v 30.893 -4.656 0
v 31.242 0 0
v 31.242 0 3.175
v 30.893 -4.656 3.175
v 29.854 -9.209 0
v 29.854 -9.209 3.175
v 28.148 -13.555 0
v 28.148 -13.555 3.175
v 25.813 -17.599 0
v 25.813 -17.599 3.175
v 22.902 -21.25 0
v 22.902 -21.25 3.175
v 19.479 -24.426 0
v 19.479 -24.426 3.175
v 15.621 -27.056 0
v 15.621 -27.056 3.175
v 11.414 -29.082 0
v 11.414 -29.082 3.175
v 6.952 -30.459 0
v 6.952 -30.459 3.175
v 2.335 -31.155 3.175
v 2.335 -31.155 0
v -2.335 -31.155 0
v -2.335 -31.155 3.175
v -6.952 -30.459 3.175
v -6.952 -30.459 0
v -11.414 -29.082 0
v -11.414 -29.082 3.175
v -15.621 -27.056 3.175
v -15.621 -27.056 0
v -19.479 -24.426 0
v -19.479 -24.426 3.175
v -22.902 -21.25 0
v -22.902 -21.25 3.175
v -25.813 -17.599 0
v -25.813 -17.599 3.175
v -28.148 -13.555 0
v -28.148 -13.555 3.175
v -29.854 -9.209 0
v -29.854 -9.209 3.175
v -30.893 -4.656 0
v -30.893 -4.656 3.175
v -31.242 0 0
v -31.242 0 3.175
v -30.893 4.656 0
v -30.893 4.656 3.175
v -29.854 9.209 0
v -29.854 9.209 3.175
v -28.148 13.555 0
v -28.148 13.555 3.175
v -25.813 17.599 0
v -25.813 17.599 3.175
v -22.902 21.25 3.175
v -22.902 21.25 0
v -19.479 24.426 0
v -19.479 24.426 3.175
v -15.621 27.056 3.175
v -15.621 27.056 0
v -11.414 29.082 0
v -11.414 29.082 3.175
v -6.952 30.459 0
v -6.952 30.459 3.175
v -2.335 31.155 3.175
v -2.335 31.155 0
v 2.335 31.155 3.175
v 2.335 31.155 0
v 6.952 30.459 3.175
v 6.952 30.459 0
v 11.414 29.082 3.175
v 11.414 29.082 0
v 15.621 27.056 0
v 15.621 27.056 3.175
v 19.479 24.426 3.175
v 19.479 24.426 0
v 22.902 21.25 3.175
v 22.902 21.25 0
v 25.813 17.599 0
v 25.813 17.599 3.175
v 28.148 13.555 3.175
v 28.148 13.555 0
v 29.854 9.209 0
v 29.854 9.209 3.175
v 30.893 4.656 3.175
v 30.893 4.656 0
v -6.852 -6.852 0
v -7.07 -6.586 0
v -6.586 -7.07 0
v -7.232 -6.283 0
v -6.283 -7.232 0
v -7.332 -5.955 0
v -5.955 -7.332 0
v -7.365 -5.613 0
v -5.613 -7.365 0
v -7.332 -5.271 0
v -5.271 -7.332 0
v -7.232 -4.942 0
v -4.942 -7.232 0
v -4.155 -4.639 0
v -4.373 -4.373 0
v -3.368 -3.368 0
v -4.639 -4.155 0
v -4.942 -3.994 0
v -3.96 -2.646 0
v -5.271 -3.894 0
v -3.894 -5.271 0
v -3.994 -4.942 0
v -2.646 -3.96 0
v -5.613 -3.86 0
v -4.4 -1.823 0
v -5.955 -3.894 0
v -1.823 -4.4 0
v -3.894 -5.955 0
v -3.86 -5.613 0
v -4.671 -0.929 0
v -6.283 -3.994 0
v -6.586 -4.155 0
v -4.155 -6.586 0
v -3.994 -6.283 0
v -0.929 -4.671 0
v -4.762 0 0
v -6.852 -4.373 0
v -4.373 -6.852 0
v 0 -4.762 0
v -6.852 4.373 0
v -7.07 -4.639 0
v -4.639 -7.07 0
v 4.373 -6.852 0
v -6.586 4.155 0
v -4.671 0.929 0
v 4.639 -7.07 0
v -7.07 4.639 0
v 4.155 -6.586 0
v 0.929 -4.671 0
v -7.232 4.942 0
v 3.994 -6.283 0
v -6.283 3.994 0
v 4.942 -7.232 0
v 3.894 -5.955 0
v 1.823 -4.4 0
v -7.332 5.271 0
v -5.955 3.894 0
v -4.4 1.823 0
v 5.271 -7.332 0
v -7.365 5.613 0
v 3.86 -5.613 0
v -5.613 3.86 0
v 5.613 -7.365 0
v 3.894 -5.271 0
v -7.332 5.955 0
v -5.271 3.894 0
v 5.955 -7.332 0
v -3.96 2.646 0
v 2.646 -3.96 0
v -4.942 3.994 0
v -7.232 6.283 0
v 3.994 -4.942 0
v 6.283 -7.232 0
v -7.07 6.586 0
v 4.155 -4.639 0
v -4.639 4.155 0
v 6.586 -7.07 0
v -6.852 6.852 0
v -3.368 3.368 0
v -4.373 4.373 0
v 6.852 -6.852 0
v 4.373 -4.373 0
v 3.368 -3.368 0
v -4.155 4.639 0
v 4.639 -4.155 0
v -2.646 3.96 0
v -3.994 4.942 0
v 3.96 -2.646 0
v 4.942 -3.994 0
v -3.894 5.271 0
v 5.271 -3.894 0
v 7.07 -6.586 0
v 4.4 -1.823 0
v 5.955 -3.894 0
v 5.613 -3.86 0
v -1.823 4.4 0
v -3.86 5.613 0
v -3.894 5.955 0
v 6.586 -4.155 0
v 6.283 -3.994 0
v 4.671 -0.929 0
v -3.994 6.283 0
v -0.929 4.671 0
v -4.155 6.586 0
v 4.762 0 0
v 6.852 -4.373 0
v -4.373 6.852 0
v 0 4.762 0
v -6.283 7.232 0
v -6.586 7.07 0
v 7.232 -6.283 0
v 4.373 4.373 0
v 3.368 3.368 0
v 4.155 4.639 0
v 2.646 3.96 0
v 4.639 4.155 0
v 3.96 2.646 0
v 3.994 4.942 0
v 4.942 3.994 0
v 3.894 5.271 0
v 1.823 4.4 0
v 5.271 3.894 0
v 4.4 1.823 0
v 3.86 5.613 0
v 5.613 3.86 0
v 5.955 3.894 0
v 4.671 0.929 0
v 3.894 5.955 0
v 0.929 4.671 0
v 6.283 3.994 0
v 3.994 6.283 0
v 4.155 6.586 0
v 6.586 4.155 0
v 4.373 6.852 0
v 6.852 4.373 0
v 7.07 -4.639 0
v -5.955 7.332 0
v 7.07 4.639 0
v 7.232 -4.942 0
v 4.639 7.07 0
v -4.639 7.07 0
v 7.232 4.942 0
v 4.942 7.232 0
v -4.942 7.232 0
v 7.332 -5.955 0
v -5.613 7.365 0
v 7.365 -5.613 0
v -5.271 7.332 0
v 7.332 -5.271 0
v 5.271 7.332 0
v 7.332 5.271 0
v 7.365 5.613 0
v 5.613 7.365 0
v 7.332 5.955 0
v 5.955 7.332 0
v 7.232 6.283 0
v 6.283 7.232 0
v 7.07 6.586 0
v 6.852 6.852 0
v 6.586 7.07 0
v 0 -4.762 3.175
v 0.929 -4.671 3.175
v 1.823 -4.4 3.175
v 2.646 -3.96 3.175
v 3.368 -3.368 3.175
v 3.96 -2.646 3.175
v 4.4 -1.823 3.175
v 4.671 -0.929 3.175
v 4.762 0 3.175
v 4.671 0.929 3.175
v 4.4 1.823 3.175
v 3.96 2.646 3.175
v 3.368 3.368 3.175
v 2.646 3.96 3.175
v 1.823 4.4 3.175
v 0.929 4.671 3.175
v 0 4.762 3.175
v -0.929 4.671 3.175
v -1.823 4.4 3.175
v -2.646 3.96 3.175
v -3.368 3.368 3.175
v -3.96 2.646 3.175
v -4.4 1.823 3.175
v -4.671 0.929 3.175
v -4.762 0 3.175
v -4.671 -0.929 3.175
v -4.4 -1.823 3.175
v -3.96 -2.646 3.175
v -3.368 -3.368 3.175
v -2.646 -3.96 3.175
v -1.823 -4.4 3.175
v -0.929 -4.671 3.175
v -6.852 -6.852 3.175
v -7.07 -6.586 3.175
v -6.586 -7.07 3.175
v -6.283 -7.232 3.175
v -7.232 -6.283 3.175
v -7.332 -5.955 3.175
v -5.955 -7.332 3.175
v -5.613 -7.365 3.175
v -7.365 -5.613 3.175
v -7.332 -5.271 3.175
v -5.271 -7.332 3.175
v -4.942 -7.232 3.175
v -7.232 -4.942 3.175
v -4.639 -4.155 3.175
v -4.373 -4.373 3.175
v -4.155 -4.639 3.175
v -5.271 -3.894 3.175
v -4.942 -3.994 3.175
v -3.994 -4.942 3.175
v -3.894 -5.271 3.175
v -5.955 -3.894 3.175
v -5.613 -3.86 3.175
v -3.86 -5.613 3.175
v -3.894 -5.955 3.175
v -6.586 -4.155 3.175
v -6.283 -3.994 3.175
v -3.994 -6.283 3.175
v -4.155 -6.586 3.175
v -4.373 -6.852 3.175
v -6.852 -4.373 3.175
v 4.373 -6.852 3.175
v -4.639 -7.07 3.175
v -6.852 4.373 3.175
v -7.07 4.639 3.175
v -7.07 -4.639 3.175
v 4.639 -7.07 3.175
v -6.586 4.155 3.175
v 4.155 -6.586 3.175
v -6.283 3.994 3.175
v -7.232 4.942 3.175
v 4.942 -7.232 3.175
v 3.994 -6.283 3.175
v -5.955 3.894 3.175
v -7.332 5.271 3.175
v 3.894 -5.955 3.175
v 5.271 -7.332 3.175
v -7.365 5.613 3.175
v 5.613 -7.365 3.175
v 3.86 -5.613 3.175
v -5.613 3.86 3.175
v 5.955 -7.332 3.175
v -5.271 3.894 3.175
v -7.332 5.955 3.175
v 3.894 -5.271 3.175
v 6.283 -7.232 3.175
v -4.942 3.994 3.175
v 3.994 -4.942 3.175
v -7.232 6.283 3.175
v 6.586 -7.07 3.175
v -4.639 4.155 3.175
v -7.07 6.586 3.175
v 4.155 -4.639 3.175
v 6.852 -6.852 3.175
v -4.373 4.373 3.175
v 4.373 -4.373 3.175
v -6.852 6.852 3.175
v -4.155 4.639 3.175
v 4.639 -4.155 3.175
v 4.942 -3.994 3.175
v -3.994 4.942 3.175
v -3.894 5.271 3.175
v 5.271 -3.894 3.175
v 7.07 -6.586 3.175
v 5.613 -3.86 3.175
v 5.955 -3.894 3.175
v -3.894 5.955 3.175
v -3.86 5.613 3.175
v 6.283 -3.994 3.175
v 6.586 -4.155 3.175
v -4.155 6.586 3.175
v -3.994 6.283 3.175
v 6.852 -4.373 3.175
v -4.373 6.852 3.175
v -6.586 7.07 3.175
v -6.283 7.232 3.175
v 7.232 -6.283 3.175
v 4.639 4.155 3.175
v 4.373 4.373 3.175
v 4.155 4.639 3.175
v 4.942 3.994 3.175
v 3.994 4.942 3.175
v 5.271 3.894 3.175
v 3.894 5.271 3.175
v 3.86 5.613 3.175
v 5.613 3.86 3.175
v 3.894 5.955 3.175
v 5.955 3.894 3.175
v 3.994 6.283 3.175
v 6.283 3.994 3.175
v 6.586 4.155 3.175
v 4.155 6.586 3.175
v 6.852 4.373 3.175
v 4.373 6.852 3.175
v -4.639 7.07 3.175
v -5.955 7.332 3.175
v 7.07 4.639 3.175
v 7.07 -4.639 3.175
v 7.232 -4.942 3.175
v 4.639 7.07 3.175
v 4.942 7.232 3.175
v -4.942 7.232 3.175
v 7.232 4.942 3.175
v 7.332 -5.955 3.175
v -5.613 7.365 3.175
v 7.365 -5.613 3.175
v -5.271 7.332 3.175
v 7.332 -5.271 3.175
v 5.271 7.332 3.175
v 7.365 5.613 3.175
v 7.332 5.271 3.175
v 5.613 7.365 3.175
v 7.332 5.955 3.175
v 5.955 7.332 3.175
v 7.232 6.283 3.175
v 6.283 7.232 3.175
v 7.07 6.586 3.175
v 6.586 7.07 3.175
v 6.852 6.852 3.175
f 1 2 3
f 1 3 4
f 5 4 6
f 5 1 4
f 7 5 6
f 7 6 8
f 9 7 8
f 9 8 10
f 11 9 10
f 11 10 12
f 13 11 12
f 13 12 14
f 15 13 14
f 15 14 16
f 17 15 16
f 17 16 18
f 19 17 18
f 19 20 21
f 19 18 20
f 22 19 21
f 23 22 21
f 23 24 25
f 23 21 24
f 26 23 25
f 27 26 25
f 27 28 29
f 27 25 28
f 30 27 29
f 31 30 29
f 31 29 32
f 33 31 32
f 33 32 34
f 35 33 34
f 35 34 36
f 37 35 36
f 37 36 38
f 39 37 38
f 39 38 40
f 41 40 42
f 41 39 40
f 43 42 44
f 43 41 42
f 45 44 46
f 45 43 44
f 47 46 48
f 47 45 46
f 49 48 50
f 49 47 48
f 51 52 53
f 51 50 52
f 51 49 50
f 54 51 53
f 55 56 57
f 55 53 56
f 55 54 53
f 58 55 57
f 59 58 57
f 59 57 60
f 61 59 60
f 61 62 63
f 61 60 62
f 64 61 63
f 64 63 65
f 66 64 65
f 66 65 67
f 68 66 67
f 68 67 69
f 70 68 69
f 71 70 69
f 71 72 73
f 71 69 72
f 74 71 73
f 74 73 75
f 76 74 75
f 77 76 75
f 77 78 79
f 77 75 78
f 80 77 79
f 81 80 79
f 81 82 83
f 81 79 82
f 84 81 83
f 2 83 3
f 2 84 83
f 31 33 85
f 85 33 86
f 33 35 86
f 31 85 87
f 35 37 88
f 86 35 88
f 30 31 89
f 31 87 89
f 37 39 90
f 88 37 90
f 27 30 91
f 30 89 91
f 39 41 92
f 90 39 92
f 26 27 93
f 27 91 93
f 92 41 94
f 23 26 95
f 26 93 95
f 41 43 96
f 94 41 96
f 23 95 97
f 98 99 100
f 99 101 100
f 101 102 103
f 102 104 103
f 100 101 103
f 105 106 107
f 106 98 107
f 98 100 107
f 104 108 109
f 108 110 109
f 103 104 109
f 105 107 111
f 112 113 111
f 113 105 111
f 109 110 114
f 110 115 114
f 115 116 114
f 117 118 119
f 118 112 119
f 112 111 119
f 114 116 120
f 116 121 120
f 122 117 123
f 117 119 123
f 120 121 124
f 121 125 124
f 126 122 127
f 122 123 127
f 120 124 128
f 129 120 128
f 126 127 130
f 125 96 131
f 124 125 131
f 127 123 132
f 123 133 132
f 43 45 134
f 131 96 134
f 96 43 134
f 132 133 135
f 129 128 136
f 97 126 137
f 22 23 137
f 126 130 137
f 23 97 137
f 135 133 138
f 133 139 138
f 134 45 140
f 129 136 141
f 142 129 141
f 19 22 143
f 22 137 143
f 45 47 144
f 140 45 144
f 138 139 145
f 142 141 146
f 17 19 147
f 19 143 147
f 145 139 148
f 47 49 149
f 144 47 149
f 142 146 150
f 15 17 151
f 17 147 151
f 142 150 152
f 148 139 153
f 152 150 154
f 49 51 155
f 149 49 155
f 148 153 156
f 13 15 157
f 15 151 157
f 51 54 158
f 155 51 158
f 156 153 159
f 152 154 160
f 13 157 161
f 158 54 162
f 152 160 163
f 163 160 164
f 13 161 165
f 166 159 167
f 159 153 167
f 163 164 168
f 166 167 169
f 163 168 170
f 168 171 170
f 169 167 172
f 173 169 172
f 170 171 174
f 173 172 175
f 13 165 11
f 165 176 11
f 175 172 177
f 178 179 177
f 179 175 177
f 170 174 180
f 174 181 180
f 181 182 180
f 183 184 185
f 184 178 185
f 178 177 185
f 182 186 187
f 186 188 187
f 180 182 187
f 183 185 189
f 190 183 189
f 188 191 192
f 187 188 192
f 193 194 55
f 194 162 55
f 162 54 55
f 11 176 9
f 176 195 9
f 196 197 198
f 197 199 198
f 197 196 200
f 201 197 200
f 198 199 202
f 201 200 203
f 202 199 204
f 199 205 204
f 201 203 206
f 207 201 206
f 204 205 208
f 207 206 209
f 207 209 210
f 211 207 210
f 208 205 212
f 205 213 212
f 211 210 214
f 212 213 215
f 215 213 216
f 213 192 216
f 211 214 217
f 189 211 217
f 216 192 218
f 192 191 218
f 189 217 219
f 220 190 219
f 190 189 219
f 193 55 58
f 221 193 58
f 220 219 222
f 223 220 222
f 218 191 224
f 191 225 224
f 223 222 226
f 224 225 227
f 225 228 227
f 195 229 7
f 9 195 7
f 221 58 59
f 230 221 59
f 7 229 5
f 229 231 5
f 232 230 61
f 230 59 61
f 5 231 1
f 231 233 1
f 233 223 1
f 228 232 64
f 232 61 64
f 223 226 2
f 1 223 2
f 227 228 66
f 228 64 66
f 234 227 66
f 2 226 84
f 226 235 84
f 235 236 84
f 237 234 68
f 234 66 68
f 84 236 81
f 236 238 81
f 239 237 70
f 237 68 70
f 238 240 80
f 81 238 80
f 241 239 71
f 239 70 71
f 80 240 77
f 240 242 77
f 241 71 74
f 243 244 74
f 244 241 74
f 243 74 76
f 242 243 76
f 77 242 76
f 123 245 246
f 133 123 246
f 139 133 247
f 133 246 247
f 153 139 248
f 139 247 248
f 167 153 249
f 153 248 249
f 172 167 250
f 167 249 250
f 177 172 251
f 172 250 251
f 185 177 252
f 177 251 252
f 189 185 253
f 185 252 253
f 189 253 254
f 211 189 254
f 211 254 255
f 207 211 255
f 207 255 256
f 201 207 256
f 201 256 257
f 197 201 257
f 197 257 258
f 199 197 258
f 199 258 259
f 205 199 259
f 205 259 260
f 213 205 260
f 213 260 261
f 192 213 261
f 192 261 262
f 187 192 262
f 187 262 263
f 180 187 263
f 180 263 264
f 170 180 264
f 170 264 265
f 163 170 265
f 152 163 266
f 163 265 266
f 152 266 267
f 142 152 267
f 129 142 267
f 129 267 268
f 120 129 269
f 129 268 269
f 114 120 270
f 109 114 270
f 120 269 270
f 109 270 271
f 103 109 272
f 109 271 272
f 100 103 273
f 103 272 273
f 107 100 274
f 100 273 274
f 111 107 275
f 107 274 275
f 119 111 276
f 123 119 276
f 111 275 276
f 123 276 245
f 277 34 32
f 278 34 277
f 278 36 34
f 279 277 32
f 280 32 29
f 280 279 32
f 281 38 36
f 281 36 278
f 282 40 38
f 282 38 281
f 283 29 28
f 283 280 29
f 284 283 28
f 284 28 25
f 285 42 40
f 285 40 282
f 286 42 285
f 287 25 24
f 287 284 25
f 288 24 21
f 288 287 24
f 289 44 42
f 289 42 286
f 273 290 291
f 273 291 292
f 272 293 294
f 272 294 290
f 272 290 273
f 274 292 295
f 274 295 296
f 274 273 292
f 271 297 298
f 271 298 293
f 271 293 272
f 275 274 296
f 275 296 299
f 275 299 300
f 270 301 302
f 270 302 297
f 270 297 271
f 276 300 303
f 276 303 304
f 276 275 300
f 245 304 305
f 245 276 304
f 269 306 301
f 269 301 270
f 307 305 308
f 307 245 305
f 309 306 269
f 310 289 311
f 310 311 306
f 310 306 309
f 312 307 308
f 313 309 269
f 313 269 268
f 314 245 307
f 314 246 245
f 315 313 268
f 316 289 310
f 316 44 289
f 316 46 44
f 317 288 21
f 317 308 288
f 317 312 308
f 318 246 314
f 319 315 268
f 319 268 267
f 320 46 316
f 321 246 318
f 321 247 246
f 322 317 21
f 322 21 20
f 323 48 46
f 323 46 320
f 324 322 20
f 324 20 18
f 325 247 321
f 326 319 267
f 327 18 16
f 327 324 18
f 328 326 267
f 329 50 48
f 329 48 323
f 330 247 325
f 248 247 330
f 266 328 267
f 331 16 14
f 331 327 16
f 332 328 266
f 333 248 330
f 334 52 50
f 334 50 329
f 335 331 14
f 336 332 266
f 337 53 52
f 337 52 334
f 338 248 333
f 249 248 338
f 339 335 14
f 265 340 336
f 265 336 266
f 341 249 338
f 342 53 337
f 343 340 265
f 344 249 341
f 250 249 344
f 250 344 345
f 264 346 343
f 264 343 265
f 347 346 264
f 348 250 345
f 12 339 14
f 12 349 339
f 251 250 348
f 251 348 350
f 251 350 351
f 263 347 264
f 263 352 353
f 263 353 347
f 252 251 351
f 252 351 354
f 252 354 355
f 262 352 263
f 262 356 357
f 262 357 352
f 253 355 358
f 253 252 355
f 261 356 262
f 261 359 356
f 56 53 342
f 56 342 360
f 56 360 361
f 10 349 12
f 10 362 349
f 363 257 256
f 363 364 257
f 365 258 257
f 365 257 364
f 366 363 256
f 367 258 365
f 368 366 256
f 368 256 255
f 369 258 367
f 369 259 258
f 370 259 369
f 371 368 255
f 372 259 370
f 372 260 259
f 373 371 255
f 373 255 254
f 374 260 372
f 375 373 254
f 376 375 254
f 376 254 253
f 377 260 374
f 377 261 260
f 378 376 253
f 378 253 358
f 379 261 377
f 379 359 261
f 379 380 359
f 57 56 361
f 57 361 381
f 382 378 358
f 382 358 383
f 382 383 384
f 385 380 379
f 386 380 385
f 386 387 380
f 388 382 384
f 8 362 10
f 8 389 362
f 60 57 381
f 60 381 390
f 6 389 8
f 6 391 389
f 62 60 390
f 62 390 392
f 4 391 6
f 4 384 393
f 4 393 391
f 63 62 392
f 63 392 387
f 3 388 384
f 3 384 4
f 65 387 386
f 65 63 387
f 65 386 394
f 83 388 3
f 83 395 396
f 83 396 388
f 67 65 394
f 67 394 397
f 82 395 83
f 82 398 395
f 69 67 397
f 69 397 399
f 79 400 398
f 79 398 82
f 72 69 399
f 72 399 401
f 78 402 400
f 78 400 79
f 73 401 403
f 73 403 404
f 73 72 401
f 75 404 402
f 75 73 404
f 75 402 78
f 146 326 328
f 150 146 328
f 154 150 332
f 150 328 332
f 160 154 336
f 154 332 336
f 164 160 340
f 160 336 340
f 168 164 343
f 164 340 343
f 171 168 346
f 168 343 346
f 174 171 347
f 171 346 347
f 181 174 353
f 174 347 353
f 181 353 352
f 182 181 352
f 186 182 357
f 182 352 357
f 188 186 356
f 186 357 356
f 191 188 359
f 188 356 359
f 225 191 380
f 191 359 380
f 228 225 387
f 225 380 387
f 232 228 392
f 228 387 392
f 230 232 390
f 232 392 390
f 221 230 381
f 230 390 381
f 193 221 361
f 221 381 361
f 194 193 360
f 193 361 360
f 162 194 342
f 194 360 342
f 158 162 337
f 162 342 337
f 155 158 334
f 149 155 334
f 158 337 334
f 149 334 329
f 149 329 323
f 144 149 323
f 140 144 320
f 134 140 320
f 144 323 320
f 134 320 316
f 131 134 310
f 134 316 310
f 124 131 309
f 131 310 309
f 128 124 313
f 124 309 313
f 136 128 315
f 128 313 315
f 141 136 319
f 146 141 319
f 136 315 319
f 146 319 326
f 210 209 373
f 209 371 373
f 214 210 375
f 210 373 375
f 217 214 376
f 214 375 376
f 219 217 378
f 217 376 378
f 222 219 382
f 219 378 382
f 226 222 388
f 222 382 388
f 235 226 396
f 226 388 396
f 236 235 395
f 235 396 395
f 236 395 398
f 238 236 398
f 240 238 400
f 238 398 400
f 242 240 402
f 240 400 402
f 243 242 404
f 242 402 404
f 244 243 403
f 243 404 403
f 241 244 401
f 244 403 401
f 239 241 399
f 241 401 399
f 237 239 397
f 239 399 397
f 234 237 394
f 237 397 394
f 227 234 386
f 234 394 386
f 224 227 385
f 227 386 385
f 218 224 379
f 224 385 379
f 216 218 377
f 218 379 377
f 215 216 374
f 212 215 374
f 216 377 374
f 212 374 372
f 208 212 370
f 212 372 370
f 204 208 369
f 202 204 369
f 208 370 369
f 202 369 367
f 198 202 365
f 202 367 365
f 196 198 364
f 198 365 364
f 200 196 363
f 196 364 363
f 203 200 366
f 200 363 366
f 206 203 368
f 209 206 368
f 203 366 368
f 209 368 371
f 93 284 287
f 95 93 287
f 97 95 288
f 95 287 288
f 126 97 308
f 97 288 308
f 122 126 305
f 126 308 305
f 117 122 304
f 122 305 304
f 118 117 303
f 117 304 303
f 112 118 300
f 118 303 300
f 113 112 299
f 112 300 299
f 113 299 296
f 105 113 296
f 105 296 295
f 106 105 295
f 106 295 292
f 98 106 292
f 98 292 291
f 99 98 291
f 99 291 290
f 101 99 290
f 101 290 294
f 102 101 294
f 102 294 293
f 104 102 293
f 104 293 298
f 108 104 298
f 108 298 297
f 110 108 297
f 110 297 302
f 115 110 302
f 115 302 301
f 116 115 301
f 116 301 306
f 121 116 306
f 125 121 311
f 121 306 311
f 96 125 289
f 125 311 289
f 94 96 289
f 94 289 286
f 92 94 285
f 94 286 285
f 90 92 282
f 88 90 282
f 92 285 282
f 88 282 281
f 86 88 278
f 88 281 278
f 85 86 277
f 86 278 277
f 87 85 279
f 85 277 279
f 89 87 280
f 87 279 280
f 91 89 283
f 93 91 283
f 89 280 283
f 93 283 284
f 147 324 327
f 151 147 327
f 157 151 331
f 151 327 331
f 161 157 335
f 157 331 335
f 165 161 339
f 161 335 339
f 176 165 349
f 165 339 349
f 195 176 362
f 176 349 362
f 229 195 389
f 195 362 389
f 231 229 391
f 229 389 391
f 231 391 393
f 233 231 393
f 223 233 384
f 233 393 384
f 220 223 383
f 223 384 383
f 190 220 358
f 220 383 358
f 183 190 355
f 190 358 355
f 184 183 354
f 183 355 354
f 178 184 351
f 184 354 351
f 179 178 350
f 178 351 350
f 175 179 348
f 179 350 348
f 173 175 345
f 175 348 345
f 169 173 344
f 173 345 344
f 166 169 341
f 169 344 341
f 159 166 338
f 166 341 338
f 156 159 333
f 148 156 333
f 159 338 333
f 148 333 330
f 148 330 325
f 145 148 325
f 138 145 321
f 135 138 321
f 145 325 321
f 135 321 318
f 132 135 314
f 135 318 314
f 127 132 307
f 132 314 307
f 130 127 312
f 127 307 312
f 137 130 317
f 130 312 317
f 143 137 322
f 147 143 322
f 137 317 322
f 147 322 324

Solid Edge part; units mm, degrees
sketch "Sketch1" plane through (0, 0, 0) normal (0, 0, 1) x (1, 0, 0)
  circle A0 centre (0, 0) radius 31.242
  dimension "D1" = 62.484
extrude "Protrusion1" add sketch "Sketch1" along normal blind 3.175
hole "Hole_1" at (0, 0, 3.175) direction (0, 0, -1) diameter 9.525 end up to next
hole "Hole_2" at (5.6127, 5.6127, 3.175) direction (0, 0, -1) diameter 3.5052 end up to next
hole "Hole1" at (5.6127, -5.6127, 3.175) direction (0, 0, -1) diameter 3.5052 end up to next
hole "Hole2" at (-5.6127, -5.6127, 3.175) direction (0, 0, -1) diameter 3.5052 end up to next
hole "Hole3" at (-5.6127, 5.6127, 3.175) direction (0, 0, -1) diameter 3.5052 end up to next
properties part number "ARM-04" material "Polypropylene, general purpose"
